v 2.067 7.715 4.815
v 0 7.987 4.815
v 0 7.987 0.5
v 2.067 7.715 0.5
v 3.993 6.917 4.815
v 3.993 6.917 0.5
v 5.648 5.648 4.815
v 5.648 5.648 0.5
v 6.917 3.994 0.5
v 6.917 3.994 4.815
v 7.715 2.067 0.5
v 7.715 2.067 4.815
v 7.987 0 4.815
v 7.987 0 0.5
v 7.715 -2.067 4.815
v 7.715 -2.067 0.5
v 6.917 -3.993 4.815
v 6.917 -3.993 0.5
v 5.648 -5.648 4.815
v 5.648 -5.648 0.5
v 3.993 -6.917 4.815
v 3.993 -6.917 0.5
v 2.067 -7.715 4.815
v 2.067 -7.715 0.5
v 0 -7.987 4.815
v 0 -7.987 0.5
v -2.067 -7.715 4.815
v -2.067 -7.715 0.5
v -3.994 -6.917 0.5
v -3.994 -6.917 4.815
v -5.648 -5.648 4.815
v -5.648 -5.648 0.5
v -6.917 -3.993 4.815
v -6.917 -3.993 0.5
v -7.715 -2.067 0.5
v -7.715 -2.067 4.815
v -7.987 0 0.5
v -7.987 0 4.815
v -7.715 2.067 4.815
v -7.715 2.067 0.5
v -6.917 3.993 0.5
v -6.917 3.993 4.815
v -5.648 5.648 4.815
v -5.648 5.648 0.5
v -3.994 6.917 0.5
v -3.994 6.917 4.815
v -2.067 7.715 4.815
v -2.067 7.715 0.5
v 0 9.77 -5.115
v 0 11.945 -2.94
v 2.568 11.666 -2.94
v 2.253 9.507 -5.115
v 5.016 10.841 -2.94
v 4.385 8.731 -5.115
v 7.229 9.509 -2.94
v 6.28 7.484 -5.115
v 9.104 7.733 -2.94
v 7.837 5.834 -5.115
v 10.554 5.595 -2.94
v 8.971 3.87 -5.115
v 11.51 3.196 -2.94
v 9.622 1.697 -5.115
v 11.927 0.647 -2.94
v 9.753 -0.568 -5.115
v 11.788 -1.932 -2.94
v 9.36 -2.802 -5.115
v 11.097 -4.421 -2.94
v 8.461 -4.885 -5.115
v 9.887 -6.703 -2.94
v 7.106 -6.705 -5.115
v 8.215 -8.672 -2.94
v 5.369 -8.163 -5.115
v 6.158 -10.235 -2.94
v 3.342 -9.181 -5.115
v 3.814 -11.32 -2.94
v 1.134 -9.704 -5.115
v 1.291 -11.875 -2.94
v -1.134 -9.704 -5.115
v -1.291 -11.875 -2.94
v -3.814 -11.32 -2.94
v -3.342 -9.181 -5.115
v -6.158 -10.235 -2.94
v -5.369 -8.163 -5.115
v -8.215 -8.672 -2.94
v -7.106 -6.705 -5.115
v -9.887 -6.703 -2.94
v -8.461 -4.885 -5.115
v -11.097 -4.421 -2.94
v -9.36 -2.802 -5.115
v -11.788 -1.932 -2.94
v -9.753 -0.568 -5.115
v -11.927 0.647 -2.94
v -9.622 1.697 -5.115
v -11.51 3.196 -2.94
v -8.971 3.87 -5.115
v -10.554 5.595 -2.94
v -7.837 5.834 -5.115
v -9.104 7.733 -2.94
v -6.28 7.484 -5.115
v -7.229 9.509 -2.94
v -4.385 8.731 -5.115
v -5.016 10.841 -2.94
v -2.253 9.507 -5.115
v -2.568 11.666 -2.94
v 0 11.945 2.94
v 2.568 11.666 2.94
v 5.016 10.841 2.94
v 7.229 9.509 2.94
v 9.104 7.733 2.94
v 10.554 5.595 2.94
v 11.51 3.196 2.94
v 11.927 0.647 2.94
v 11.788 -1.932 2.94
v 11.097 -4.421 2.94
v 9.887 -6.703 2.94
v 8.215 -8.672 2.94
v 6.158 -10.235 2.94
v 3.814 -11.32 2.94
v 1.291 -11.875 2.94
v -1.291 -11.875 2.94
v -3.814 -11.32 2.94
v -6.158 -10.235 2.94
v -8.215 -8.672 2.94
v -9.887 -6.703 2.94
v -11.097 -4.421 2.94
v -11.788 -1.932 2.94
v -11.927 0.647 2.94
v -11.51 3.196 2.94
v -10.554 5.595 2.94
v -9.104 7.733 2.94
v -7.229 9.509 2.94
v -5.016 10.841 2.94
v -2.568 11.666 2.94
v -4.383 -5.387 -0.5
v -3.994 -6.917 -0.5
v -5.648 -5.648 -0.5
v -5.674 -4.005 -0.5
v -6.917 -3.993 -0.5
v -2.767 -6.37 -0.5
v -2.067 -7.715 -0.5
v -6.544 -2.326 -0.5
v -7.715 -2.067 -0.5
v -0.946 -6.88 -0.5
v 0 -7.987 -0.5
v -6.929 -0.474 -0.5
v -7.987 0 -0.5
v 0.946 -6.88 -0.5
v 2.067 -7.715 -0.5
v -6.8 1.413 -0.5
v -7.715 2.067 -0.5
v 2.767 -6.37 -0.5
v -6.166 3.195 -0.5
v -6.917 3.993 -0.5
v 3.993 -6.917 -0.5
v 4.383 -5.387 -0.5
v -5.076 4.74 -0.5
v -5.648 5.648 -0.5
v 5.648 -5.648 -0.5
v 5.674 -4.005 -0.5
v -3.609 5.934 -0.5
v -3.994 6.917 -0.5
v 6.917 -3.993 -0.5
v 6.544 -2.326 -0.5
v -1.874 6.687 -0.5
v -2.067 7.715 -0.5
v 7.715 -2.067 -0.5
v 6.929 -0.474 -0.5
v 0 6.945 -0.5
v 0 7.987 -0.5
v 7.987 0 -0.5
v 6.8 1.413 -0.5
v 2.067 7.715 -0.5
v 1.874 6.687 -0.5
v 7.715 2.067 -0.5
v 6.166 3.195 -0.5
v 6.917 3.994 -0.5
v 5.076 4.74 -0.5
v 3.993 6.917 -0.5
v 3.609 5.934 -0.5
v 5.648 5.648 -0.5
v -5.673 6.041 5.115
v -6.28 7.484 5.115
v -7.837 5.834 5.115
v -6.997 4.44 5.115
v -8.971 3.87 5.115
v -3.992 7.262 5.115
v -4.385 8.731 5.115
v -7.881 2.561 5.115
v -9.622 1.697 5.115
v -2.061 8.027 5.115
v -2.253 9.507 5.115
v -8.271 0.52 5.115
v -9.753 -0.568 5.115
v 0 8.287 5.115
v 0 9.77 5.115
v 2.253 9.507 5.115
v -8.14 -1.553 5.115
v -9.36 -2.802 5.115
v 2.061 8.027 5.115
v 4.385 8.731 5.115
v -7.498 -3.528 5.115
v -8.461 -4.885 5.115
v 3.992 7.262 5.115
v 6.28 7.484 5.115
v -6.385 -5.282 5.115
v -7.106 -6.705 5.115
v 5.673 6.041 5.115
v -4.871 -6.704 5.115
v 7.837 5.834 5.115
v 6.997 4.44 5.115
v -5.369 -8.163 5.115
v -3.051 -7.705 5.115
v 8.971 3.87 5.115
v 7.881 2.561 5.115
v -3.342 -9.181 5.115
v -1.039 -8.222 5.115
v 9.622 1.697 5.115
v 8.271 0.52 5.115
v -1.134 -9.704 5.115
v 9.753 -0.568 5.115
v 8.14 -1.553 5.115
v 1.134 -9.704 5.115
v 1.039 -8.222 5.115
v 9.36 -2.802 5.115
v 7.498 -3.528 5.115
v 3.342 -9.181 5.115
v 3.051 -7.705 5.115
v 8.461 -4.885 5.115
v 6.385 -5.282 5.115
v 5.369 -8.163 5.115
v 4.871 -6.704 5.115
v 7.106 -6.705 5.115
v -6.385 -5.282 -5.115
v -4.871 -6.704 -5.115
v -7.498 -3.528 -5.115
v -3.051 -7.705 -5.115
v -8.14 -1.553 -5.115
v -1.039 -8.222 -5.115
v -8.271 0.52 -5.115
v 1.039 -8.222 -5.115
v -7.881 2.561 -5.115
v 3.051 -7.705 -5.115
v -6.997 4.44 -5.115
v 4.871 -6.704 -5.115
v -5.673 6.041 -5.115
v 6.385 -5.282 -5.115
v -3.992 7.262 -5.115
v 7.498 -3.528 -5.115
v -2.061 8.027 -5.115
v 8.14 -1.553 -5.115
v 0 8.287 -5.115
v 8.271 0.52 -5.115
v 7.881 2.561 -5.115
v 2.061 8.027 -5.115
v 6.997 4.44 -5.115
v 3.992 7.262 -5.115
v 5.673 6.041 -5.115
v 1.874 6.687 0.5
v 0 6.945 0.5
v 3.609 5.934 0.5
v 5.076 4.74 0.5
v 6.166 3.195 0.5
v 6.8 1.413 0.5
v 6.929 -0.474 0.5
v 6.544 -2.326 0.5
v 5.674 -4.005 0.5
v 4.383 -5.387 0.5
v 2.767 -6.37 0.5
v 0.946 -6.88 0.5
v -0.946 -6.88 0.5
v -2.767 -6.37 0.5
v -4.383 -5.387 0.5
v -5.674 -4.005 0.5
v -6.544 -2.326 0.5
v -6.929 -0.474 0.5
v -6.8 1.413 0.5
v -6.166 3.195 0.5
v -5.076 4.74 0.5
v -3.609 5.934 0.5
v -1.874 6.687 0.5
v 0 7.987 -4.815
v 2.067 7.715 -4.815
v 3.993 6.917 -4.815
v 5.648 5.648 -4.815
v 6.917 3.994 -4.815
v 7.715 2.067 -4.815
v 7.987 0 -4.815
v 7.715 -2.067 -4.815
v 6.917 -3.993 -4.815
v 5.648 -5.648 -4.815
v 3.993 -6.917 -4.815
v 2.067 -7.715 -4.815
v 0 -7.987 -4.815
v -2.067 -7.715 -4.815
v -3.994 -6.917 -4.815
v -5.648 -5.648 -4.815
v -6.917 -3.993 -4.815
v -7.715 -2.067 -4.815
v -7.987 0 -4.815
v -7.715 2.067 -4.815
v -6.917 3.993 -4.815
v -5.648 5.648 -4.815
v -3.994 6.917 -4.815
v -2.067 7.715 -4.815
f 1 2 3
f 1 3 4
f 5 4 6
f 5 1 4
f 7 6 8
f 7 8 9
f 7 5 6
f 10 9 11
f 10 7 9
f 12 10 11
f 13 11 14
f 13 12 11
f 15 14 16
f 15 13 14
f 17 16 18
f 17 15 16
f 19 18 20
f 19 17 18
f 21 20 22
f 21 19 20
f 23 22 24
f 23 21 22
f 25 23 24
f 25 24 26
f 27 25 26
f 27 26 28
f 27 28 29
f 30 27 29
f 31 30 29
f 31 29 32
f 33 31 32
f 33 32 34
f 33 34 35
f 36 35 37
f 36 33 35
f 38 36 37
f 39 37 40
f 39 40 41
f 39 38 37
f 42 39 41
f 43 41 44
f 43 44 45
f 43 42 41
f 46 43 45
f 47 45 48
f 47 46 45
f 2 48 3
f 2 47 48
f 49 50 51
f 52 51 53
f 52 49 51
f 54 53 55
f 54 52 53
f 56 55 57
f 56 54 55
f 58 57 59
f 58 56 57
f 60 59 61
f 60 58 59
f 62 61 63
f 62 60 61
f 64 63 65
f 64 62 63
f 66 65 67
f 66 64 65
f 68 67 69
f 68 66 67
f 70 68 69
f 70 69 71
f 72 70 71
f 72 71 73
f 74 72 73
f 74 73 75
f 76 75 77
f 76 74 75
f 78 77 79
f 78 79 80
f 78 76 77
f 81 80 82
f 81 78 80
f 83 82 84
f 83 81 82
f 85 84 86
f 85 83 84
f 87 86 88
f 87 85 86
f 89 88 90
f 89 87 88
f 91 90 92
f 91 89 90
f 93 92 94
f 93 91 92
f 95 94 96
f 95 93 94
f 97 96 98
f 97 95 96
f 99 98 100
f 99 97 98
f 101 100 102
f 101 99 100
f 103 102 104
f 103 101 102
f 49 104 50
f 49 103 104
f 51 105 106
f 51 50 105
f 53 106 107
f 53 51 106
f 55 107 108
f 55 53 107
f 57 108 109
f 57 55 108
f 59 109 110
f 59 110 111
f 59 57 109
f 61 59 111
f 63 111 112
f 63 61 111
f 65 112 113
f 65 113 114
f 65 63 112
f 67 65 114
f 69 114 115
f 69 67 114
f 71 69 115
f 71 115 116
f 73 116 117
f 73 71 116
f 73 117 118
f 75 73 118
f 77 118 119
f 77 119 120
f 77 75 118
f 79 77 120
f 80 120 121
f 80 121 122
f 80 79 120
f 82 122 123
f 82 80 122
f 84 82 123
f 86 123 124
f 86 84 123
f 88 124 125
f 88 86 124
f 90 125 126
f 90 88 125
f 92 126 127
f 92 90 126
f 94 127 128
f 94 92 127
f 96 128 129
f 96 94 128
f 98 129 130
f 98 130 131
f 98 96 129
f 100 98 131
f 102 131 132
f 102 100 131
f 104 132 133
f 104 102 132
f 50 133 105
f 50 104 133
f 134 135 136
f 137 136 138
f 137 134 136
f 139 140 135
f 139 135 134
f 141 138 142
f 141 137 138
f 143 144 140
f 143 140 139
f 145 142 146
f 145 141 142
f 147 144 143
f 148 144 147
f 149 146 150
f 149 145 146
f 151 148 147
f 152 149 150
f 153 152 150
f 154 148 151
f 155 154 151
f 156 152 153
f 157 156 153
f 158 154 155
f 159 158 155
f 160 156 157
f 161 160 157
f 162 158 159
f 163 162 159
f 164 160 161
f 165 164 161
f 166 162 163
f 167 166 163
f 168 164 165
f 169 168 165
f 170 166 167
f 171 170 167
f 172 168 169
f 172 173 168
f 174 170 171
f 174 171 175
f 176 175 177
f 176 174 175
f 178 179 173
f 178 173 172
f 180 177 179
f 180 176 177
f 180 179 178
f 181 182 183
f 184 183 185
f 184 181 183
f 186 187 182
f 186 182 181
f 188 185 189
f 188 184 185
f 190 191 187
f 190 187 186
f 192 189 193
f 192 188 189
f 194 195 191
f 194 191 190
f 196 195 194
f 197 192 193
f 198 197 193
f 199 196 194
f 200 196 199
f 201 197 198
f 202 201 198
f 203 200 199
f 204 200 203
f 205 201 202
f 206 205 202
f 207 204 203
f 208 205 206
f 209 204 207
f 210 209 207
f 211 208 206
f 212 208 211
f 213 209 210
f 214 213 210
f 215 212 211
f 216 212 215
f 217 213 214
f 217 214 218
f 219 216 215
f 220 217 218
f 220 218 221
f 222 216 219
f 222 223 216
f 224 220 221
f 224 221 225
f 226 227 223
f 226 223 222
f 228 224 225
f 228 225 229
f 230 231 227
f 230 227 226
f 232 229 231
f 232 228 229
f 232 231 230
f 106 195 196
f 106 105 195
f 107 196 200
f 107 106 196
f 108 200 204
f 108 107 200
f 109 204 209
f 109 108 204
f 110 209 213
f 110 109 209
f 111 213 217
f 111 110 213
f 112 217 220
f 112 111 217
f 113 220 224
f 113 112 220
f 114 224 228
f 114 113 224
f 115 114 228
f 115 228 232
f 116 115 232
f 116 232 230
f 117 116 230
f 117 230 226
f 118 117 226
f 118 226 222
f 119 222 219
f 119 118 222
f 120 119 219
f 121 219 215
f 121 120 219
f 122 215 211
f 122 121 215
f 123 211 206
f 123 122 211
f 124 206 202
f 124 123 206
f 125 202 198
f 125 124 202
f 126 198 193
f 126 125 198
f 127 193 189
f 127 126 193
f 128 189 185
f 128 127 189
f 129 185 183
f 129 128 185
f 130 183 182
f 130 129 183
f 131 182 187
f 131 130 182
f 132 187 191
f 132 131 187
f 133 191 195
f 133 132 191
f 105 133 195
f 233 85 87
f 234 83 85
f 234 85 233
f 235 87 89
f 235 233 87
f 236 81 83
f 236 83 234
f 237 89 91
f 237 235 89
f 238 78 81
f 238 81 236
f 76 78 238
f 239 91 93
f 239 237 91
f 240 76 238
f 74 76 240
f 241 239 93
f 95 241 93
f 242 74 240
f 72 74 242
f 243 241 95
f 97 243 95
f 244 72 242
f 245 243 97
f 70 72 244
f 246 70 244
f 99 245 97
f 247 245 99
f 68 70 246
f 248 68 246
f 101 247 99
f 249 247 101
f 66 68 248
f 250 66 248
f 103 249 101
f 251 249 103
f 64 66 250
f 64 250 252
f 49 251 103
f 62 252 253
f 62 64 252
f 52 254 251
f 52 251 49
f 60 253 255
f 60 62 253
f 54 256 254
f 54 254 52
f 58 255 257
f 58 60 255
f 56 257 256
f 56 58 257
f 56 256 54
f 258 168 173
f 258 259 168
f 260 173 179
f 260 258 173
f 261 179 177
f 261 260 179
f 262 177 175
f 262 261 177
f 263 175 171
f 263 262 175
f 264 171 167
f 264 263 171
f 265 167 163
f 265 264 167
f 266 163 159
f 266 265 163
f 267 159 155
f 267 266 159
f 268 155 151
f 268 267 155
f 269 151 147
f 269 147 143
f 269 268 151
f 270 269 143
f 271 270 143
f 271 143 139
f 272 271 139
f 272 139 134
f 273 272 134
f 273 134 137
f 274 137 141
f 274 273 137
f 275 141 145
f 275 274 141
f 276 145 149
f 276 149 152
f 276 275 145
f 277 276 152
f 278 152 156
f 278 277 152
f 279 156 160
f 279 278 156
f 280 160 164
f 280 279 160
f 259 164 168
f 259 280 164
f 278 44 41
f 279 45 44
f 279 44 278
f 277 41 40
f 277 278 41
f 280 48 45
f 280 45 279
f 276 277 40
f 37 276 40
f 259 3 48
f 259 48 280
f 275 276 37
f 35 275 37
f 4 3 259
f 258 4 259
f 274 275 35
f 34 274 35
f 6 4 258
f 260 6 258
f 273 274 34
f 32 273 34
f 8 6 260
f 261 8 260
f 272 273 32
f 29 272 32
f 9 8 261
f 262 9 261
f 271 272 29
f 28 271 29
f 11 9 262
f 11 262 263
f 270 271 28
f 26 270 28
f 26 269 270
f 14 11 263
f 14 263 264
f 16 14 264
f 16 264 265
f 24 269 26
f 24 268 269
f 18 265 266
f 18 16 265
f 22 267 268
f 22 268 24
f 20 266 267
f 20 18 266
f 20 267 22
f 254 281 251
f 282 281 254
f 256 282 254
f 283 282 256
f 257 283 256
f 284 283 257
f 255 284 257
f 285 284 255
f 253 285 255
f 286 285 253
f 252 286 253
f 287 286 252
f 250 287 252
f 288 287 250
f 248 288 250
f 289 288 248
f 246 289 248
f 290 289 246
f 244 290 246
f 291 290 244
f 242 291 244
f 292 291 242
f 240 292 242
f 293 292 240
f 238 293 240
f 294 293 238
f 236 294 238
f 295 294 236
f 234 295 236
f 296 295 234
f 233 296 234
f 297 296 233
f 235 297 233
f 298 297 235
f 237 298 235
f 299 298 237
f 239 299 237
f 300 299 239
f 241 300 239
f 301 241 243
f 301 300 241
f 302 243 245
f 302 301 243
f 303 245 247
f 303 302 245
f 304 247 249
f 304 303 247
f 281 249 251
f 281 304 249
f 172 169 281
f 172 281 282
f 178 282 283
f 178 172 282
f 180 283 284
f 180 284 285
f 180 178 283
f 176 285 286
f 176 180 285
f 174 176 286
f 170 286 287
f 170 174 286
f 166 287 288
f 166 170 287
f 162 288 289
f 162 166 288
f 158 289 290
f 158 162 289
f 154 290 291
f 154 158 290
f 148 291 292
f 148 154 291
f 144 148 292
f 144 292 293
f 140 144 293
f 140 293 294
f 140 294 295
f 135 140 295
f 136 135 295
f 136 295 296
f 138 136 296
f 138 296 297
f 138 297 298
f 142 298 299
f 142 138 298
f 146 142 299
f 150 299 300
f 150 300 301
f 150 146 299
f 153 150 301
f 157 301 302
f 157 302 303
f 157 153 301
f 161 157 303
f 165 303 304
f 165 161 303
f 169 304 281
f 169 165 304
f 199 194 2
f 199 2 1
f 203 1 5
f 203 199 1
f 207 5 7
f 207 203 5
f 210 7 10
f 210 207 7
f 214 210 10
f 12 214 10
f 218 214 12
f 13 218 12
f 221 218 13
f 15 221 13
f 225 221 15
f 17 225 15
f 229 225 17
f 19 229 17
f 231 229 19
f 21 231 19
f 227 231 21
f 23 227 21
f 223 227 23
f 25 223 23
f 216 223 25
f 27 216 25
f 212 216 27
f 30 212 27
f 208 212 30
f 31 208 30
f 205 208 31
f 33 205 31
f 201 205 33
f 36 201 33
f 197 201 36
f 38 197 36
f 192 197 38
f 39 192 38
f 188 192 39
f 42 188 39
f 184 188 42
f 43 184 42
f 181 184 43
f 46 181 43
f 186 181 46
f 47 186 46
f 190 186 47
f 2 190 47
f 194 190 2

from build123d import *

# Parameters (mm, degrees)
CHAMFER1_SIZE = 0.3


with BuildPart() as part:
    # Sketch1 → Revolve1 (revolve)
    with BuildSketch(Plane(origin=(0, 0, 0), x_dir=(0, 0, -1), z_dir=(1, 0, 0))):
        Polygon((-2.94, 11.945), (2.94, 11.945), (5.115, 9.77), (5.115, 7.987), (0.5, 7.987), (0.5, 6.945), (-0.5, 6.945), (-0.5, 7.987), (-5.115, 7.987), (-5.115, 9.77), align=None)
    revolve(axis=Axis((0, 0, 5.115), (0, 0, -1)))

    # Chamfer1
    chamfer1_edges = [part.edges().sort_by_distance(p)[0] for p in [
        (0, -7.987, 5.115),
        (0, -7.987, -5.115),
    ]]
    chamfer(chamfer1_edges, length=CHAMFER1_SIZE)


solid = part.part
